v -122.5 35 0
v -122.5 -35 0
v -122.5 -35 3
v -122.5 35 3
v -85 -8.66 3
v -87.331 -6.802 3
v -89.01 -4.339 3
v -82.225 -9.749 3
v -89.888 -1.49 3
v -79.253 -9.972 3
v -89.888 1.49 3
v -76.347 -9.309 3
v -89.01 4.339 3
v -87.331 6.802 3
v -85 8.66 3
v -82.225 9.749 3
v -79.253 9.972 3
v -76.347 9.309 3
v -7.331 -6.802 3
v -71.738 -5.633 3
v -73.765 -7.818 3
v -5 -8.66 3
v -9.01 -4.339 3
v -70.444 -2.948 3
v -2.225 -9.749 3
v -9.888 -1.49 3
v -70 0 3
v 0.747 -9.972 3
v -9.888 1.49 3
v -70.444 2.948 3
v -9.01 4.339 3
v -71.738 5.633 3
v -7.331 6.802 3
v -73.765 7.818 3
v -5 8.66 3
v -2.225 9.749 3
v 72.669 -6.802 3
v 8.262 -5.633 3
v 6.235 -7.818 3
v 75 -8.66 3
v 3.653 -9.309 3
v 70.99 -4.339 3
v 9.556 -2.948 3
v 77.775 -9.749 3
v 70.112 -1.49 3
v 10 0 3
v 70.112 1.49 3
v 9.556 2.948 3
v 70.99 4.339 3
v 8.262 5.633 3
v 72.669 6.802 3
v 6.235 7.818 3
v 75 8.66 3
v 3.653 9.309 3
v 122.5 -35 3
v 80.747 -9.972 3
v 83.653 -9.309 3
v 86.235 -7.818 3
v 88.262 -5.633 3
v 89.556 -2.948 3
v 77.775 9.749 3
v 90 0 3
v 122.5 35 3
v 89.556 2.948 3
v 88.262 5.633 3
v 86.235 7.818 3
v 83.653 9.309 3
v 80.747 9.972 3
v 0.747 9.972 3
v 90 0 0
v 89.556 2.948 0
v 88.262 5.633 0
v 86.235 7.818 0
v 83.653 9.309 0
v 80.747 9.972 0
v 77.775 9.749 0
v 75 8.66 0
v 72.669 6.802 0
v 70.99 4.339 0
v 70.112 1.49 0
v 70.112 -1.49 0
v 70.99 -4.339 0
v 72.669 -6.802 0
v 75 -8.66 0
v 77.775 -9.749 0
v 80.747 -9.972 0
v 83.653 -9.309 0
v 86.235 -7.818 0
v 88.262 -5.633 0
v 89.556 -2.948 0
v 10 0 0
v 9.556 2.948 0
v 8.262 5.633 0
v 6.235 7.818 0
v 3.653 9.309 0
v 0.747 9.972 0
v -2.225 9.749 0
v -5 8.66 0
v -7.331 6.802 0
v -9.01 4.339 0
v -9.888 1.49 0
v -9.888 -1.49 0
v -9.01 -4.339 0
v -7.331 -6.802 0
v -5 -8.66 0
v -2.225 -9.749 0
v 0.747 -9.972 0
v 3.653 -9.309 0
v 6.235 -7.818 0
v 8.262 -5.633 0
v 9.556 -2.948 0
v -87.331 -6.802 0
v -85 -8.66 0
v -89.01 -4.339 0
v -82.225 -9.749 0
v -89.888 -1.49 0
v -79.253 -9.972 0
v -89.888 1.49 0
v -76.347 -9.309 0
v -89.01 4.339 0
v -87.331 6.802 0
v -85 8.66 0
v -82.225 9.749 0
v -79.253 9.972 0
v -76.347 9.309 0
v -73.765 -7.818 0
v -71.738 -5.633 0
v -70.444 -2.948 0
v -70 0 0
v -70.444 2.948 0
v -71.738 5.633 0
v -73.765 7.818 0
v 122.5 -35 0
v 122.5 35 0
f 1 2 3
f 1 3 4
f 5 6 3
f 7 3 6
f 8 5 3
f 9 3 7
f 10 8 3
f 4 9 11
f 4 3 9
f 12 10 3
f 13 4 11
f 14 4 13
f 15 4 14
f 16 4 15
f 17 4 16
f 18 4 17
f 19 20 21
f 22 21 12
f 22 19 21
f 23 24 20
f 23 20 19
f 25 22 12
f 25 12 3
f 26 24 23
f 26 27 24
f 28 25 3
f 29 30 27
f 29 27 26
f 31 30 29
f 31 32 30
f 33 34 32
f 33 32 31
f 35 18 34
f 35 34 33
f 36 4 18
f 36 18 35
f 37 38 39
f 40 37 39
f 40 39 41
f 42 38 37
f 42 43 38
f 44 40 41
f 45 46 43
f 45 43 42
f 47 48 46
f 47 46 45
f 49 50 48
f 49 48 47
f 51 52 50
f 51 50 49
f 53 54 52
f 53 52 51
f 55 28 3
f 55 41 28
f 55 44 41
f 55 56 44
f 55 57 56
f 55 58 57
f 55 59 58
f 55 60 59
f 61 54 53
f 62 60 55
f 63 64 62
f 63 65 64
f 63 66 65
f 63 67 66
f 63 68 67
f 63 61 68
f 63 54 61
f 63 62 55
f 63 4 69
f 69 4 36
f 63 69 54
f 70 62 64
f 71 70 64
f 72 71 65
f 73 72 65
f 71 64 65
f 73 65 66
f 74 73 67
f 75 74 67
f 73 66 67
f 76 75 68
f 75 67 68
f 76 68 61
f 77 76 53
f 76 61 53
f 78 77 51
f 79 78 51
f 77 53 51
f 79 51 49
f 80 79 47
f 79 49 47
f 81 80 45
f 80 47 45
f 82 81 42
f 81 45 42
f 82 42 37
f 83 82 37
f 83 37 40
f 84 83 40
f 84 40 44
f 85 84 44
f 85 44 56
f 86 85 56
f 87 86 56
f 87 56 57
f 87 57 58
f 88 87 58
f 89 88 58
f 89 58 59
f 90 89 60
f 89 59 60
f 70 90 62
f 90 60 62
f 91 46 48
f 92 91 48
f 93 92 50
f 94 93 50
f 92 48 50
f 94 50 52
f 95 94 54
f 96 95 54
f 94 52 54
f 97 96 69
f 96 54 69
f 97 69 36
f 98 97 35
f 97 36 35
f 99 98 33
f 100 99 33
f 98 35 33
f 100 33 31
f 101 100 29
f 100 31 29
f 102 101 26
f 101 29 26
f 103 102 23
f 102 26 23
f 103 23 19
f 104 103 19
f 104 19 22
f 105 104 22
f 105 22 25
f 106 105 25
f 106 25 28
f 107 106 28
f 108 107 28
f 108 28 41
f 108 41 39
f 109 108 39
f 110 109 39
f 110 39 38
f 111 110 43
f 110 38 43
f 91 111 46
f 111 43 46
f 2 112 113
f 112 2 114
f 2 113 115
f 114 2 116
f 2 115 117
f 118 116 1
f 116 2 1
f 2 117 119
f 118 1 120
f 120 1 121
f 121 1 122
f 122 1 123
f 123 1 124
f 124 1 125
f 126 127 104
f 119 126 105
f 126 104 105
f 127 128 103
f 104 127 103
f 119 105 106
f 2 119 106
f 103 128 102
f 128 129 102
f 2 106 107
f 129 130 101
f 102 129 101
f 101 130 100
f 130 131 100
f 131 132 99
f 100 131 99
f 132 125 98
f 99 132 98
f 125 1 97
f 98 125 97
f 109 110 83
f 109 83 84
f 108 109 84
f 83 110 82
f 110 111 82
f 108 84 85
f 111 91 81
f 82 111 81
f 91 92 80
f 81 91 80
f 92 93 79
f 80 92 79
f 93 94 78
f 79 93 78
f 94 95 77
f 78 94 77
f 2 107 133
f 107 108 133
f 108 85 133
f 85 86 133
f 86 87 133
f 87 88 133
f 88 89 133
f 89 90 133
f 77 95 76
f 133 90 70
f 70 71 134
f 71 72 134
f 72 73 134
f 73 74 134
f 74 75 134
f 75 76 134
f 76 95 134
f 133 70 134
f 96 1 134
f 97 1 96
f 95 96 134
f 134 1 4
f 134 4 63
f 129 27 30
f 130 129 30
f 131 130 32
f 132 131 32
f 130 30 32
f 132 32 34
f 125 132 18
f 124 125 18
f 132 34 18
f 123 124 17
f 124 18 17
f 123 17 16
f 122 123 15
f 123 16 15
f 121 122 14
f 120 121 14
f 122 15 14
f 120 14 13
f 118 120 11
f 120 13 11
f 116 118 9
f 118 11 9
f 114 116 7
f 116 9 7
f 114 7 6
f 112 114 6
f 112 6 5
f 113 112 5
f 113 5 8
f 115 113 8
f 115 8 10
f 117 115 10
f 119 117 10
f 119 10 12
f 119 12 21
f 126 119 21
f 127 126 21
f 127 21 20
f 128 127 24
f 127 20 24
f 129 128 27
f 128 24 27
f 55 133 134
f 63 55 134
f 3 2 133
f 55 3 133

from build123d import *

# Parameters (mm, degrees)
SKETCH1_W           = 245
SKETCH1_H           = 70
BOSS_EXTRUDE1_DEPTH = 3
SKETCH2_R           = 10
CUT_EXTRUDE1_DEPTH  = 3


with BuildPart() as part:
    # Sketch1 → Boss-Extrude1 (new body)
    with BuildSketch(Plane.XY):
        Rectangle(SKETCH1_W, SKETCH1_H)
    extrude(amount=BOSS_EXTRUDE1_DEPTH)

    # Sketch2 → Cut-Extrude1 (cut)
    with BuildSketch(Plane.XY.offset(3)):
        with Locations((-80, 0)):
            Circle(SKETCH2_R)
        Circle(SKETCH2_R)
        with Locations((80, 0)):
            Circle(SKETCH2_R)
    extrude(amount=-CUT_EXTRUDE1_DEPTH, mode=Mode.SUBTRACT)


solid = part.part
